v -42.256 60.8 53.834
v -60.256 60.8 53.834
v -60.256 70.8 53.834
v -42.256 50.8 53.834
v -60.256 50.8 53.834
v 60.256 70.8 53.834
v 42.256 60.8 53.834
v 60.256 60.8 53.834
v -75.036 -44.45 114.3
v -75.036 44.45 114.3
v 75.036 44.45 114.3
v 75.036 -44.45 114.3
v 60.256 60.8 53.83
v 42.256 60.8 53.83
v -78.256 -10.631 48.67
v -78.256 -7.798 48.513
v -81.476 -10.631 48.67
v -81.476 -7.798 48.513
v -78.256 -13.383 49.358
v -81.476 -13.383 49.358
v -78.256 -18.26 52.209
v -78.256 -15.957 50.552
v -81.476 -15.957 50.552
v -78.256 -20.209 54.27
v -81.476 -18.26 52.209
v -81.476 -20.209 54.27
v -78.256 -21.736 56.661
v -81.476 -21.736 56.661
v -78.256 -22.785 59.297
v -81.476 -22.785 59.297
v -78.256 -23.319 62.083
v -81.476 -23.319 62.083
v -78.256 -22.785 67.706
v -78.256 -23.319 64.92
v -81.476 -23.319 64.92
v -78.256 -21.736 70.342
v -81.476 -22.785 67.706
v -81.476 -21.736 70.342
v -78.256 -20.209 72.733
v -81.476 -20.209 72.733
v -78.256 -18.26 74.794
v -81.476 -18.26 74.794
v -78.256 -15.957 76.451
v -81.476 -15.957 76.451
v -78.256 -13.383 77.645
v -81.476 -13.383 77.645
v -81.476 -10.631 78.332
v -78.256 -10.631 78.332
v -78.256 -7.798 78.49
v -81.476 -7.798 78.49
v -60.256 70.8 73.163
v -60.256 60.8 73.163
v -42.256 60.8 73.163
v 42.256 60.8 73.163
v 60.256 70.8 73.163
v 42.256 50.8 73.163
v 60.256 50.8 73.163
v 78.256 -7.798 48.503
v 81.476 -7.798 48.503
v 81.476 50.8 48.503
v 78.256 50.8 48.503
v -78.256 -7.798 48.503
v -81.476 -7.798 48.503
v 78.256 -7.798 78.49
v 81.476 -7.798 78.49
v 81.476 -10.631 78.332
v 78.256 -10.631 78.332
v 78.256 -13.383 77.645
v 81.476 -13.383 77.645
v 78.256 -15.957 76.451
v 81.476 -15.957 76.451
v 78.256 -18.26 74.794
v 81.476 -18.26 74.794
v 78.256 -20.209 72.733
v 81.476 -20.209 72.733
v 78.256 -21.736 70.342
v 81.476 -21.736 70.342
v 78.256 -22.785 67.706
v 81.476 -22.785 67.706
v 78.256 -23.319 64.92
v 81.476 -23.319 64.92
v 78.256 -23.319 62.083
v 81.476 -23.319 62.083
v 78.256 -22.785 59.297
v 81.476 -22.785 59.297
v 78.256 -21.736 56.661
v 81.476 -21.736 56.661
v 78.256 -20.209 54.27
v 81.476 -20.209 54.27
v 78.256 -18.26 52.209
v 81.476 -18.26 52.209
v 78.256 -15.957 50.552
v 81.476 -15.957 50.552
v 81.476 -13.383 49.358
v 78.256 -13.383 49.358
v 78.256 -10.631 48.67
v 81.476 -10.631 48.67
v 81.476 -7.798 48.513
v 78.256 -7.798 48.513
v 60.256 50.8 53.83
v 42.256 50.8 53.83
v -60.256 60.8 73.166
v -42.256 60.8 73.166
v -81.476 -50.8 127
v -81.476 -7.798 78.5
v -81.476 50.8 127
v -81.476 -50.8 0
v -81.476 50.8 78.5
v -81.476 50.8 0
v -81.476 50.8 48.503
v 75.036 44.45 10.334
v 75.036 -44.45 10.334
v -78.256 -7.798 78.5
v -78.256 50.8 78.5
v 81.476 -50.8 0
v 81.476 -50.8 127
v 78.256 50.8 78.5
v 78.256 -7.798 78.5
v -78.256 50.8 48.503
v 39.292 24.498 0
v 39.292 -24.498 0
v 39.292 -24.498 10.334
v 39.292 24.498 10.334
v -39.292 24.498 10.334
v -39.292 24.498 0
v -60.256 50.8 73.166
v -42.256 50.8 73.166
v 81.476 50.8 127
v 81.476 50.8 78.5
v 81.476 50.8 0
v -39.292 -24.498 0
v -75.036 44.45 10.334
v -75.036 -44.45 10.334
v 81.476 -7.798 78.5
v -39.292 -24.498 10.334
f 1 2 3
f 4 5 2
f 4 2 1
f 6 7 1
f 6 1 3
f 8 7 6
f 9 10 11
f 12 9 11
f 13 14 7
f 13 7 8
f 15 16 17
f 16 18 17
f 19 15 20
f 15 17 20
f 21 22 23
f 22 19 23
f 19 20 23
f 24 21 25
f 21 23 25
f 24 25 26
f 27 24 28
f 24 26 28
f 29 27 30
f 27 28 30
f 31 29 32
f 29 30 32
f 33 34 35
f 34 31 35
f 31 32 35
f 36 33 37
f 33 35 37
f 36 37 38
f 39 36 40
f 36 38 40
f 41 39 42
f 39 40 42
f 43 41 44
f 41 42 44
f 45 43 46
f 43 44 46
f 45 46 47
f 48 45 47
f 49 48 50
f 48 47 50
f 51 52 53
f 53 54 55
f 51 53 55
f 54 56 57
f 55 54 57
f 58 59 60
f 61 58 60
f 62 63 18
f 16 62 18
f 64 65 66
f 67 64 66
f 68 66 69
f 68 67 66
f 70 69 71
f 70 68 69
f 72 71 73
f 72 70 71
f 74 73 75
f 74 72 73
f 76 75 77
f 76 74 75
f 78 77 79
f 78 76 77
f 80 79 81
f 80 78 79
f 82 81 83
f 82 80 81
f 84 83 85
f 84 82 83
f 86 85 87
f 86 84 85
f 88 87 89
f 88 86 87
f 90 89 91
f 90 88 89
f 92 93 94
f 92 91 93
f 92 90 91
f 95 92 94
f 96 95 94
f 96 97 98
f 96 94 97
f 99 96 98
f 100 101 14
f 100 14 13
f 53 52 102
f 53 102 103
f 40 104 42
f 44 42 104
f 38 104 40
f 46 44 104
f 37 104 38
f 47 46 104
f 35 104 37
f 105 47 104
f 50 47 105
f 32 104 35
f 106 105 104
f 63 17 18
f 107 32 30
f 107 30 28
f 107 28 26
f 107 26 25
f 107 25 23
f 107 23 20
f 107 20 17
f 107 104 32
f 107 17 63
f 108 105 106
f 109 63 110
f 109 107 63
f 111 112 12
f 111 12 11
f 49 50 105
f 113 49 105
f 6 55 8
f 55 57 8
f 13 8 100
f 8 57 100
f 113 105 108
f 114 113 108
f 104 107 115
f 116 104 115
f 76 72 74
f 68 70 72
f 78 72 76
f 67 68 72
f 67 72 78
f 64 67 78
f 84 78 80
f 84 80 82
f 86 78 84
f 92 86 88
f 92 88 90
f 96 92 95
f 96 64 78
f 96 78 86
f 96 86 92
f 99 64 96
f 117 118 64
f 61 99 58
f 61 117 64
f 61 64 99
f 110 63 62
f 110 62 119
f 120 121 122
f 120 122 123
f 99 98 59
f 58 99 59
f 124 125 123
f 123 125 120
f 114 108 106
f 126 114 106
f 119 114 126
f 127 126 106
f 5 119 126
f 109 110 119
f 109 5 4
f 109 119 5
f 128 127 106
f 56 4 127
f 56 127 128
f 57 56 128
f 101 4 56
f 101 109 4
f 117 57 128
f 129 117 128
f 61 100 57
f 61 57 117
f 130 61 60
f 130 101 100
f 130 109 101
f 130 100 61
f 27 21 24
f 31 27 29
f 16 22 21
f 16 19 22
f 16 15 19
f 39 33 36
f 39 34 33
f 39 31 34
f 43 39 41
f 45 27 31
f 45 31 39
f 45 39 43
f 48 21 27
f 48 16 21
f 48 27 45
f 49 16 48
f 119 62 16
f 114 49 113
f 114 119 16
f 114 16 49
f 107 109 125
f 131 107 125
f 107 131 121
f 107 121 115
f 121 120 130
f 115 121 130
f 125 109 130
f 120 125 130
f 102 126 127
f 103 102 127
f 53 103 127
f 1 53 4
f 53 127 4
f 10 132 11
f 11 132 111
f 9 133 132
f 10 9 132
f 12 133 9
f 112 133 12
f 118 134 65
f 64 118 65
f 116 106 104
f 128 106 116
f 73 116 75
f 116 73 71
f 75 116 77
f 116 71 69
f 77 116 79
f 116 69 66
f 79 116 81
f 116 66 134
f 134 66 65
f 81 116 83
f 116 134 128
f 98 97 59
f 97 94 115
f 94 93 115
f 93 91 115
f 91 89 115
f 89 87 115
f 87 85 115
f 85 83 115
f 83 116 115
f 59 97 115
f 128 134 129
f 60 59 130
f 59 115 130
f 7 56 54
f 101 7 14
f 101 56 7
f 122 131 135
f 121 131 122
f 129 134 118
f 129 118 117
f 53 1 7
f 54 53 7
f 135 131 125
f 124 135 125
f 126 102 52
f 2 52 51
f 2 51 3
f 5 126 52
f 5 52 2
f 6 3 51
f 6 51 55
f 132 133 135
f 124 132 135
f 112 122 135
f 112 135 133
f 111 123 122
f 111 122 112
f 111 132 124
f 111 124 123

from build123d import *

# Parameters (mm, degrees)
SKETCH2_W           = 162.951605996
SKETCH2_H           = 101.6
BOSS_EXTRUDE1_DEPTH = 127
SKETCH6_W           = 150.072334712
SKETCH6_H           = 88.9
CUT_EXTRUDE1_DEPTH  = 114.3
SKETCH14_W          = 29.9974
SKETCH14_H          = 58.598040667
CUT_EXTRUDE2_DEPTH  = 3.22
SKETCH15_R          = 15
CUT_EXTRUDE3_DEPTH  = 3.22
SKETCH17_W          = 29.9974
SKETCH17_H          = 58.598040667
CUT_EXTRUDE4_DEPTH  = 3.22
CUT_EXTRUDE5_START  = -3.22
SKETCH18_R          = 15
CUT_EXTRUDE5_DEPTH  = 3.22
SKETCH19_W          = 18
SKETCH19_H          = 19.33286688
SKETCH19_H_2        = 19.332866873
BOSS_EXTRUDE2_DEPTH = 10
SKETCH20_W          = 120.511605996
SKETCH20_H          = 19.329300313
BOSS_EXTRUDE3_DEPTH = 10
SKETCH28_W          = 150.072334712
SKETCH28_H          = 88.9
BOSS_EXTRUDE5_DEPTH = 10.33404711
SKETCH29_W          = 78.5832061
SKETCH29_H          = 48.996471626
CUT_EXTRUDE6_DEPTH  = 10.33404711


with BuildPart() as part:
    # Sketch2 → Boss-Extrude1 (new body)
    with BuildSketch(Plane.XY):
        Rectangle(SKETCH2_W, SKETCH2_H)
    extrude(amount=BOSS_EXTRUDE1_DEPTH)

    # Sketch6 → Cut-Extrude1 (cut)
    with BuildSketch(Plane.XY):
        Rectangle(SKETCH6_W, SKETCH6_H)
    extrude(amount=CUT_EXTRUDE1_DEPTH, mode=Mode.SUBTRACT)

    # Sketch14 → Cut-Extrude2 (cut)
    with BuildSketch(Plane.ZY.offset(81.475802998)):
        with Locations((63.5013, 21.500979667)):
            Rectangle(SKETCH14_W, SKETCH14_H)
    extrude(amount=-CUT_EXTRUDE2_DEPTH, mode=Mode.SUBTRACT)

    # Sketch15 → Cut-Extrude3 (cut)
    with BuildSketch(Plane.ZY.offset(81.475802998)):
        with Locations((63.5013, -8.386572038)):
            Circle(SKETCH15_R)
    extrude(amount=-CUT_EXTRUDE3_DEPTH, mode=Mode.SUBTRACT)

    # Sketch17 → Cut-Extrude4 (cut)
    with BuildSketch(Plane(origin=(81.475802998, 0, 0), x_dir=(0, 0, -1), z_dir=(1, 0, 0))):
        with Locations((-63.5013, 21.500979667)):
            Rectangle(SKETCH17_W, SKETCH17_H)
    extrude(amount=-CUT_EXTRUDE4_DEPTH, mode=Mode.SUBTRACT)

    # Sketch18 → Cut-Extrude5 (cut)
    with BuildSketch(Plane(origin=(81.475802998, 0, 0), x_dir=(0, 0, -1), z_dir=(1, 0, 0)).offset(CUT_EXTRUDE5_START)):
        with Locations((-63.5013, -8.386572038)):
            Circle(SKETCH18_R)
    extrude(amount=CUT_EXTRUDE5_DEPTH, mode=Mode.SUBTRACT)

    # Sketch19 → Boss-Extrude2 (add)
    with BuildSketch(Plane(origin=(0, 50.8, 0), x_dir=(1, 0, 0), z_dir=(0, 1, 0))):
        with Locations((-51.255802998, -63.5)):
            Rectangle(SKETCH19_W, SKETCH19_H)
        with Locations((51.255802998, -63.496433436)):
            Rectangle(SKETCH19_W, SKETCH19_H_2)
    extrude(amount=BOSS_EXTRUDE2_DEPTH)

    # Sketch20 → Boss-Extrude3 (add)
    with BuildSketch(Plane(origin=(0, 60.8, 0), x_dir=(1, 0, 0), z_dir=(0, 1, 0))):
        with Locations((0, -63.498216716)):
            Rectangle(SKETCH20_W, SKETCH20_H)
    extrude(amount=BOSS_EXTRUDE3_DEPTH)

    # Sketch28 → Boss-Extrude5 (add)
    with BuildSketch(Plane.XY):
        Rectangle(SKETCH28_W, SKETCH28_H)
    extrude(amount=BOSS_EXTRUDE5_DEPTH)

    # Sketch29 → Cut-Extrude6 (cut)
    with BuildSketch(Plane.XY):
        Rectangle(SKETCH29_W, SKETCH29_H)
    extrude(amount=CUT_EXTRUDE6_DEPTH, mode=Mode.SUBTRACT)


solid = part.part
